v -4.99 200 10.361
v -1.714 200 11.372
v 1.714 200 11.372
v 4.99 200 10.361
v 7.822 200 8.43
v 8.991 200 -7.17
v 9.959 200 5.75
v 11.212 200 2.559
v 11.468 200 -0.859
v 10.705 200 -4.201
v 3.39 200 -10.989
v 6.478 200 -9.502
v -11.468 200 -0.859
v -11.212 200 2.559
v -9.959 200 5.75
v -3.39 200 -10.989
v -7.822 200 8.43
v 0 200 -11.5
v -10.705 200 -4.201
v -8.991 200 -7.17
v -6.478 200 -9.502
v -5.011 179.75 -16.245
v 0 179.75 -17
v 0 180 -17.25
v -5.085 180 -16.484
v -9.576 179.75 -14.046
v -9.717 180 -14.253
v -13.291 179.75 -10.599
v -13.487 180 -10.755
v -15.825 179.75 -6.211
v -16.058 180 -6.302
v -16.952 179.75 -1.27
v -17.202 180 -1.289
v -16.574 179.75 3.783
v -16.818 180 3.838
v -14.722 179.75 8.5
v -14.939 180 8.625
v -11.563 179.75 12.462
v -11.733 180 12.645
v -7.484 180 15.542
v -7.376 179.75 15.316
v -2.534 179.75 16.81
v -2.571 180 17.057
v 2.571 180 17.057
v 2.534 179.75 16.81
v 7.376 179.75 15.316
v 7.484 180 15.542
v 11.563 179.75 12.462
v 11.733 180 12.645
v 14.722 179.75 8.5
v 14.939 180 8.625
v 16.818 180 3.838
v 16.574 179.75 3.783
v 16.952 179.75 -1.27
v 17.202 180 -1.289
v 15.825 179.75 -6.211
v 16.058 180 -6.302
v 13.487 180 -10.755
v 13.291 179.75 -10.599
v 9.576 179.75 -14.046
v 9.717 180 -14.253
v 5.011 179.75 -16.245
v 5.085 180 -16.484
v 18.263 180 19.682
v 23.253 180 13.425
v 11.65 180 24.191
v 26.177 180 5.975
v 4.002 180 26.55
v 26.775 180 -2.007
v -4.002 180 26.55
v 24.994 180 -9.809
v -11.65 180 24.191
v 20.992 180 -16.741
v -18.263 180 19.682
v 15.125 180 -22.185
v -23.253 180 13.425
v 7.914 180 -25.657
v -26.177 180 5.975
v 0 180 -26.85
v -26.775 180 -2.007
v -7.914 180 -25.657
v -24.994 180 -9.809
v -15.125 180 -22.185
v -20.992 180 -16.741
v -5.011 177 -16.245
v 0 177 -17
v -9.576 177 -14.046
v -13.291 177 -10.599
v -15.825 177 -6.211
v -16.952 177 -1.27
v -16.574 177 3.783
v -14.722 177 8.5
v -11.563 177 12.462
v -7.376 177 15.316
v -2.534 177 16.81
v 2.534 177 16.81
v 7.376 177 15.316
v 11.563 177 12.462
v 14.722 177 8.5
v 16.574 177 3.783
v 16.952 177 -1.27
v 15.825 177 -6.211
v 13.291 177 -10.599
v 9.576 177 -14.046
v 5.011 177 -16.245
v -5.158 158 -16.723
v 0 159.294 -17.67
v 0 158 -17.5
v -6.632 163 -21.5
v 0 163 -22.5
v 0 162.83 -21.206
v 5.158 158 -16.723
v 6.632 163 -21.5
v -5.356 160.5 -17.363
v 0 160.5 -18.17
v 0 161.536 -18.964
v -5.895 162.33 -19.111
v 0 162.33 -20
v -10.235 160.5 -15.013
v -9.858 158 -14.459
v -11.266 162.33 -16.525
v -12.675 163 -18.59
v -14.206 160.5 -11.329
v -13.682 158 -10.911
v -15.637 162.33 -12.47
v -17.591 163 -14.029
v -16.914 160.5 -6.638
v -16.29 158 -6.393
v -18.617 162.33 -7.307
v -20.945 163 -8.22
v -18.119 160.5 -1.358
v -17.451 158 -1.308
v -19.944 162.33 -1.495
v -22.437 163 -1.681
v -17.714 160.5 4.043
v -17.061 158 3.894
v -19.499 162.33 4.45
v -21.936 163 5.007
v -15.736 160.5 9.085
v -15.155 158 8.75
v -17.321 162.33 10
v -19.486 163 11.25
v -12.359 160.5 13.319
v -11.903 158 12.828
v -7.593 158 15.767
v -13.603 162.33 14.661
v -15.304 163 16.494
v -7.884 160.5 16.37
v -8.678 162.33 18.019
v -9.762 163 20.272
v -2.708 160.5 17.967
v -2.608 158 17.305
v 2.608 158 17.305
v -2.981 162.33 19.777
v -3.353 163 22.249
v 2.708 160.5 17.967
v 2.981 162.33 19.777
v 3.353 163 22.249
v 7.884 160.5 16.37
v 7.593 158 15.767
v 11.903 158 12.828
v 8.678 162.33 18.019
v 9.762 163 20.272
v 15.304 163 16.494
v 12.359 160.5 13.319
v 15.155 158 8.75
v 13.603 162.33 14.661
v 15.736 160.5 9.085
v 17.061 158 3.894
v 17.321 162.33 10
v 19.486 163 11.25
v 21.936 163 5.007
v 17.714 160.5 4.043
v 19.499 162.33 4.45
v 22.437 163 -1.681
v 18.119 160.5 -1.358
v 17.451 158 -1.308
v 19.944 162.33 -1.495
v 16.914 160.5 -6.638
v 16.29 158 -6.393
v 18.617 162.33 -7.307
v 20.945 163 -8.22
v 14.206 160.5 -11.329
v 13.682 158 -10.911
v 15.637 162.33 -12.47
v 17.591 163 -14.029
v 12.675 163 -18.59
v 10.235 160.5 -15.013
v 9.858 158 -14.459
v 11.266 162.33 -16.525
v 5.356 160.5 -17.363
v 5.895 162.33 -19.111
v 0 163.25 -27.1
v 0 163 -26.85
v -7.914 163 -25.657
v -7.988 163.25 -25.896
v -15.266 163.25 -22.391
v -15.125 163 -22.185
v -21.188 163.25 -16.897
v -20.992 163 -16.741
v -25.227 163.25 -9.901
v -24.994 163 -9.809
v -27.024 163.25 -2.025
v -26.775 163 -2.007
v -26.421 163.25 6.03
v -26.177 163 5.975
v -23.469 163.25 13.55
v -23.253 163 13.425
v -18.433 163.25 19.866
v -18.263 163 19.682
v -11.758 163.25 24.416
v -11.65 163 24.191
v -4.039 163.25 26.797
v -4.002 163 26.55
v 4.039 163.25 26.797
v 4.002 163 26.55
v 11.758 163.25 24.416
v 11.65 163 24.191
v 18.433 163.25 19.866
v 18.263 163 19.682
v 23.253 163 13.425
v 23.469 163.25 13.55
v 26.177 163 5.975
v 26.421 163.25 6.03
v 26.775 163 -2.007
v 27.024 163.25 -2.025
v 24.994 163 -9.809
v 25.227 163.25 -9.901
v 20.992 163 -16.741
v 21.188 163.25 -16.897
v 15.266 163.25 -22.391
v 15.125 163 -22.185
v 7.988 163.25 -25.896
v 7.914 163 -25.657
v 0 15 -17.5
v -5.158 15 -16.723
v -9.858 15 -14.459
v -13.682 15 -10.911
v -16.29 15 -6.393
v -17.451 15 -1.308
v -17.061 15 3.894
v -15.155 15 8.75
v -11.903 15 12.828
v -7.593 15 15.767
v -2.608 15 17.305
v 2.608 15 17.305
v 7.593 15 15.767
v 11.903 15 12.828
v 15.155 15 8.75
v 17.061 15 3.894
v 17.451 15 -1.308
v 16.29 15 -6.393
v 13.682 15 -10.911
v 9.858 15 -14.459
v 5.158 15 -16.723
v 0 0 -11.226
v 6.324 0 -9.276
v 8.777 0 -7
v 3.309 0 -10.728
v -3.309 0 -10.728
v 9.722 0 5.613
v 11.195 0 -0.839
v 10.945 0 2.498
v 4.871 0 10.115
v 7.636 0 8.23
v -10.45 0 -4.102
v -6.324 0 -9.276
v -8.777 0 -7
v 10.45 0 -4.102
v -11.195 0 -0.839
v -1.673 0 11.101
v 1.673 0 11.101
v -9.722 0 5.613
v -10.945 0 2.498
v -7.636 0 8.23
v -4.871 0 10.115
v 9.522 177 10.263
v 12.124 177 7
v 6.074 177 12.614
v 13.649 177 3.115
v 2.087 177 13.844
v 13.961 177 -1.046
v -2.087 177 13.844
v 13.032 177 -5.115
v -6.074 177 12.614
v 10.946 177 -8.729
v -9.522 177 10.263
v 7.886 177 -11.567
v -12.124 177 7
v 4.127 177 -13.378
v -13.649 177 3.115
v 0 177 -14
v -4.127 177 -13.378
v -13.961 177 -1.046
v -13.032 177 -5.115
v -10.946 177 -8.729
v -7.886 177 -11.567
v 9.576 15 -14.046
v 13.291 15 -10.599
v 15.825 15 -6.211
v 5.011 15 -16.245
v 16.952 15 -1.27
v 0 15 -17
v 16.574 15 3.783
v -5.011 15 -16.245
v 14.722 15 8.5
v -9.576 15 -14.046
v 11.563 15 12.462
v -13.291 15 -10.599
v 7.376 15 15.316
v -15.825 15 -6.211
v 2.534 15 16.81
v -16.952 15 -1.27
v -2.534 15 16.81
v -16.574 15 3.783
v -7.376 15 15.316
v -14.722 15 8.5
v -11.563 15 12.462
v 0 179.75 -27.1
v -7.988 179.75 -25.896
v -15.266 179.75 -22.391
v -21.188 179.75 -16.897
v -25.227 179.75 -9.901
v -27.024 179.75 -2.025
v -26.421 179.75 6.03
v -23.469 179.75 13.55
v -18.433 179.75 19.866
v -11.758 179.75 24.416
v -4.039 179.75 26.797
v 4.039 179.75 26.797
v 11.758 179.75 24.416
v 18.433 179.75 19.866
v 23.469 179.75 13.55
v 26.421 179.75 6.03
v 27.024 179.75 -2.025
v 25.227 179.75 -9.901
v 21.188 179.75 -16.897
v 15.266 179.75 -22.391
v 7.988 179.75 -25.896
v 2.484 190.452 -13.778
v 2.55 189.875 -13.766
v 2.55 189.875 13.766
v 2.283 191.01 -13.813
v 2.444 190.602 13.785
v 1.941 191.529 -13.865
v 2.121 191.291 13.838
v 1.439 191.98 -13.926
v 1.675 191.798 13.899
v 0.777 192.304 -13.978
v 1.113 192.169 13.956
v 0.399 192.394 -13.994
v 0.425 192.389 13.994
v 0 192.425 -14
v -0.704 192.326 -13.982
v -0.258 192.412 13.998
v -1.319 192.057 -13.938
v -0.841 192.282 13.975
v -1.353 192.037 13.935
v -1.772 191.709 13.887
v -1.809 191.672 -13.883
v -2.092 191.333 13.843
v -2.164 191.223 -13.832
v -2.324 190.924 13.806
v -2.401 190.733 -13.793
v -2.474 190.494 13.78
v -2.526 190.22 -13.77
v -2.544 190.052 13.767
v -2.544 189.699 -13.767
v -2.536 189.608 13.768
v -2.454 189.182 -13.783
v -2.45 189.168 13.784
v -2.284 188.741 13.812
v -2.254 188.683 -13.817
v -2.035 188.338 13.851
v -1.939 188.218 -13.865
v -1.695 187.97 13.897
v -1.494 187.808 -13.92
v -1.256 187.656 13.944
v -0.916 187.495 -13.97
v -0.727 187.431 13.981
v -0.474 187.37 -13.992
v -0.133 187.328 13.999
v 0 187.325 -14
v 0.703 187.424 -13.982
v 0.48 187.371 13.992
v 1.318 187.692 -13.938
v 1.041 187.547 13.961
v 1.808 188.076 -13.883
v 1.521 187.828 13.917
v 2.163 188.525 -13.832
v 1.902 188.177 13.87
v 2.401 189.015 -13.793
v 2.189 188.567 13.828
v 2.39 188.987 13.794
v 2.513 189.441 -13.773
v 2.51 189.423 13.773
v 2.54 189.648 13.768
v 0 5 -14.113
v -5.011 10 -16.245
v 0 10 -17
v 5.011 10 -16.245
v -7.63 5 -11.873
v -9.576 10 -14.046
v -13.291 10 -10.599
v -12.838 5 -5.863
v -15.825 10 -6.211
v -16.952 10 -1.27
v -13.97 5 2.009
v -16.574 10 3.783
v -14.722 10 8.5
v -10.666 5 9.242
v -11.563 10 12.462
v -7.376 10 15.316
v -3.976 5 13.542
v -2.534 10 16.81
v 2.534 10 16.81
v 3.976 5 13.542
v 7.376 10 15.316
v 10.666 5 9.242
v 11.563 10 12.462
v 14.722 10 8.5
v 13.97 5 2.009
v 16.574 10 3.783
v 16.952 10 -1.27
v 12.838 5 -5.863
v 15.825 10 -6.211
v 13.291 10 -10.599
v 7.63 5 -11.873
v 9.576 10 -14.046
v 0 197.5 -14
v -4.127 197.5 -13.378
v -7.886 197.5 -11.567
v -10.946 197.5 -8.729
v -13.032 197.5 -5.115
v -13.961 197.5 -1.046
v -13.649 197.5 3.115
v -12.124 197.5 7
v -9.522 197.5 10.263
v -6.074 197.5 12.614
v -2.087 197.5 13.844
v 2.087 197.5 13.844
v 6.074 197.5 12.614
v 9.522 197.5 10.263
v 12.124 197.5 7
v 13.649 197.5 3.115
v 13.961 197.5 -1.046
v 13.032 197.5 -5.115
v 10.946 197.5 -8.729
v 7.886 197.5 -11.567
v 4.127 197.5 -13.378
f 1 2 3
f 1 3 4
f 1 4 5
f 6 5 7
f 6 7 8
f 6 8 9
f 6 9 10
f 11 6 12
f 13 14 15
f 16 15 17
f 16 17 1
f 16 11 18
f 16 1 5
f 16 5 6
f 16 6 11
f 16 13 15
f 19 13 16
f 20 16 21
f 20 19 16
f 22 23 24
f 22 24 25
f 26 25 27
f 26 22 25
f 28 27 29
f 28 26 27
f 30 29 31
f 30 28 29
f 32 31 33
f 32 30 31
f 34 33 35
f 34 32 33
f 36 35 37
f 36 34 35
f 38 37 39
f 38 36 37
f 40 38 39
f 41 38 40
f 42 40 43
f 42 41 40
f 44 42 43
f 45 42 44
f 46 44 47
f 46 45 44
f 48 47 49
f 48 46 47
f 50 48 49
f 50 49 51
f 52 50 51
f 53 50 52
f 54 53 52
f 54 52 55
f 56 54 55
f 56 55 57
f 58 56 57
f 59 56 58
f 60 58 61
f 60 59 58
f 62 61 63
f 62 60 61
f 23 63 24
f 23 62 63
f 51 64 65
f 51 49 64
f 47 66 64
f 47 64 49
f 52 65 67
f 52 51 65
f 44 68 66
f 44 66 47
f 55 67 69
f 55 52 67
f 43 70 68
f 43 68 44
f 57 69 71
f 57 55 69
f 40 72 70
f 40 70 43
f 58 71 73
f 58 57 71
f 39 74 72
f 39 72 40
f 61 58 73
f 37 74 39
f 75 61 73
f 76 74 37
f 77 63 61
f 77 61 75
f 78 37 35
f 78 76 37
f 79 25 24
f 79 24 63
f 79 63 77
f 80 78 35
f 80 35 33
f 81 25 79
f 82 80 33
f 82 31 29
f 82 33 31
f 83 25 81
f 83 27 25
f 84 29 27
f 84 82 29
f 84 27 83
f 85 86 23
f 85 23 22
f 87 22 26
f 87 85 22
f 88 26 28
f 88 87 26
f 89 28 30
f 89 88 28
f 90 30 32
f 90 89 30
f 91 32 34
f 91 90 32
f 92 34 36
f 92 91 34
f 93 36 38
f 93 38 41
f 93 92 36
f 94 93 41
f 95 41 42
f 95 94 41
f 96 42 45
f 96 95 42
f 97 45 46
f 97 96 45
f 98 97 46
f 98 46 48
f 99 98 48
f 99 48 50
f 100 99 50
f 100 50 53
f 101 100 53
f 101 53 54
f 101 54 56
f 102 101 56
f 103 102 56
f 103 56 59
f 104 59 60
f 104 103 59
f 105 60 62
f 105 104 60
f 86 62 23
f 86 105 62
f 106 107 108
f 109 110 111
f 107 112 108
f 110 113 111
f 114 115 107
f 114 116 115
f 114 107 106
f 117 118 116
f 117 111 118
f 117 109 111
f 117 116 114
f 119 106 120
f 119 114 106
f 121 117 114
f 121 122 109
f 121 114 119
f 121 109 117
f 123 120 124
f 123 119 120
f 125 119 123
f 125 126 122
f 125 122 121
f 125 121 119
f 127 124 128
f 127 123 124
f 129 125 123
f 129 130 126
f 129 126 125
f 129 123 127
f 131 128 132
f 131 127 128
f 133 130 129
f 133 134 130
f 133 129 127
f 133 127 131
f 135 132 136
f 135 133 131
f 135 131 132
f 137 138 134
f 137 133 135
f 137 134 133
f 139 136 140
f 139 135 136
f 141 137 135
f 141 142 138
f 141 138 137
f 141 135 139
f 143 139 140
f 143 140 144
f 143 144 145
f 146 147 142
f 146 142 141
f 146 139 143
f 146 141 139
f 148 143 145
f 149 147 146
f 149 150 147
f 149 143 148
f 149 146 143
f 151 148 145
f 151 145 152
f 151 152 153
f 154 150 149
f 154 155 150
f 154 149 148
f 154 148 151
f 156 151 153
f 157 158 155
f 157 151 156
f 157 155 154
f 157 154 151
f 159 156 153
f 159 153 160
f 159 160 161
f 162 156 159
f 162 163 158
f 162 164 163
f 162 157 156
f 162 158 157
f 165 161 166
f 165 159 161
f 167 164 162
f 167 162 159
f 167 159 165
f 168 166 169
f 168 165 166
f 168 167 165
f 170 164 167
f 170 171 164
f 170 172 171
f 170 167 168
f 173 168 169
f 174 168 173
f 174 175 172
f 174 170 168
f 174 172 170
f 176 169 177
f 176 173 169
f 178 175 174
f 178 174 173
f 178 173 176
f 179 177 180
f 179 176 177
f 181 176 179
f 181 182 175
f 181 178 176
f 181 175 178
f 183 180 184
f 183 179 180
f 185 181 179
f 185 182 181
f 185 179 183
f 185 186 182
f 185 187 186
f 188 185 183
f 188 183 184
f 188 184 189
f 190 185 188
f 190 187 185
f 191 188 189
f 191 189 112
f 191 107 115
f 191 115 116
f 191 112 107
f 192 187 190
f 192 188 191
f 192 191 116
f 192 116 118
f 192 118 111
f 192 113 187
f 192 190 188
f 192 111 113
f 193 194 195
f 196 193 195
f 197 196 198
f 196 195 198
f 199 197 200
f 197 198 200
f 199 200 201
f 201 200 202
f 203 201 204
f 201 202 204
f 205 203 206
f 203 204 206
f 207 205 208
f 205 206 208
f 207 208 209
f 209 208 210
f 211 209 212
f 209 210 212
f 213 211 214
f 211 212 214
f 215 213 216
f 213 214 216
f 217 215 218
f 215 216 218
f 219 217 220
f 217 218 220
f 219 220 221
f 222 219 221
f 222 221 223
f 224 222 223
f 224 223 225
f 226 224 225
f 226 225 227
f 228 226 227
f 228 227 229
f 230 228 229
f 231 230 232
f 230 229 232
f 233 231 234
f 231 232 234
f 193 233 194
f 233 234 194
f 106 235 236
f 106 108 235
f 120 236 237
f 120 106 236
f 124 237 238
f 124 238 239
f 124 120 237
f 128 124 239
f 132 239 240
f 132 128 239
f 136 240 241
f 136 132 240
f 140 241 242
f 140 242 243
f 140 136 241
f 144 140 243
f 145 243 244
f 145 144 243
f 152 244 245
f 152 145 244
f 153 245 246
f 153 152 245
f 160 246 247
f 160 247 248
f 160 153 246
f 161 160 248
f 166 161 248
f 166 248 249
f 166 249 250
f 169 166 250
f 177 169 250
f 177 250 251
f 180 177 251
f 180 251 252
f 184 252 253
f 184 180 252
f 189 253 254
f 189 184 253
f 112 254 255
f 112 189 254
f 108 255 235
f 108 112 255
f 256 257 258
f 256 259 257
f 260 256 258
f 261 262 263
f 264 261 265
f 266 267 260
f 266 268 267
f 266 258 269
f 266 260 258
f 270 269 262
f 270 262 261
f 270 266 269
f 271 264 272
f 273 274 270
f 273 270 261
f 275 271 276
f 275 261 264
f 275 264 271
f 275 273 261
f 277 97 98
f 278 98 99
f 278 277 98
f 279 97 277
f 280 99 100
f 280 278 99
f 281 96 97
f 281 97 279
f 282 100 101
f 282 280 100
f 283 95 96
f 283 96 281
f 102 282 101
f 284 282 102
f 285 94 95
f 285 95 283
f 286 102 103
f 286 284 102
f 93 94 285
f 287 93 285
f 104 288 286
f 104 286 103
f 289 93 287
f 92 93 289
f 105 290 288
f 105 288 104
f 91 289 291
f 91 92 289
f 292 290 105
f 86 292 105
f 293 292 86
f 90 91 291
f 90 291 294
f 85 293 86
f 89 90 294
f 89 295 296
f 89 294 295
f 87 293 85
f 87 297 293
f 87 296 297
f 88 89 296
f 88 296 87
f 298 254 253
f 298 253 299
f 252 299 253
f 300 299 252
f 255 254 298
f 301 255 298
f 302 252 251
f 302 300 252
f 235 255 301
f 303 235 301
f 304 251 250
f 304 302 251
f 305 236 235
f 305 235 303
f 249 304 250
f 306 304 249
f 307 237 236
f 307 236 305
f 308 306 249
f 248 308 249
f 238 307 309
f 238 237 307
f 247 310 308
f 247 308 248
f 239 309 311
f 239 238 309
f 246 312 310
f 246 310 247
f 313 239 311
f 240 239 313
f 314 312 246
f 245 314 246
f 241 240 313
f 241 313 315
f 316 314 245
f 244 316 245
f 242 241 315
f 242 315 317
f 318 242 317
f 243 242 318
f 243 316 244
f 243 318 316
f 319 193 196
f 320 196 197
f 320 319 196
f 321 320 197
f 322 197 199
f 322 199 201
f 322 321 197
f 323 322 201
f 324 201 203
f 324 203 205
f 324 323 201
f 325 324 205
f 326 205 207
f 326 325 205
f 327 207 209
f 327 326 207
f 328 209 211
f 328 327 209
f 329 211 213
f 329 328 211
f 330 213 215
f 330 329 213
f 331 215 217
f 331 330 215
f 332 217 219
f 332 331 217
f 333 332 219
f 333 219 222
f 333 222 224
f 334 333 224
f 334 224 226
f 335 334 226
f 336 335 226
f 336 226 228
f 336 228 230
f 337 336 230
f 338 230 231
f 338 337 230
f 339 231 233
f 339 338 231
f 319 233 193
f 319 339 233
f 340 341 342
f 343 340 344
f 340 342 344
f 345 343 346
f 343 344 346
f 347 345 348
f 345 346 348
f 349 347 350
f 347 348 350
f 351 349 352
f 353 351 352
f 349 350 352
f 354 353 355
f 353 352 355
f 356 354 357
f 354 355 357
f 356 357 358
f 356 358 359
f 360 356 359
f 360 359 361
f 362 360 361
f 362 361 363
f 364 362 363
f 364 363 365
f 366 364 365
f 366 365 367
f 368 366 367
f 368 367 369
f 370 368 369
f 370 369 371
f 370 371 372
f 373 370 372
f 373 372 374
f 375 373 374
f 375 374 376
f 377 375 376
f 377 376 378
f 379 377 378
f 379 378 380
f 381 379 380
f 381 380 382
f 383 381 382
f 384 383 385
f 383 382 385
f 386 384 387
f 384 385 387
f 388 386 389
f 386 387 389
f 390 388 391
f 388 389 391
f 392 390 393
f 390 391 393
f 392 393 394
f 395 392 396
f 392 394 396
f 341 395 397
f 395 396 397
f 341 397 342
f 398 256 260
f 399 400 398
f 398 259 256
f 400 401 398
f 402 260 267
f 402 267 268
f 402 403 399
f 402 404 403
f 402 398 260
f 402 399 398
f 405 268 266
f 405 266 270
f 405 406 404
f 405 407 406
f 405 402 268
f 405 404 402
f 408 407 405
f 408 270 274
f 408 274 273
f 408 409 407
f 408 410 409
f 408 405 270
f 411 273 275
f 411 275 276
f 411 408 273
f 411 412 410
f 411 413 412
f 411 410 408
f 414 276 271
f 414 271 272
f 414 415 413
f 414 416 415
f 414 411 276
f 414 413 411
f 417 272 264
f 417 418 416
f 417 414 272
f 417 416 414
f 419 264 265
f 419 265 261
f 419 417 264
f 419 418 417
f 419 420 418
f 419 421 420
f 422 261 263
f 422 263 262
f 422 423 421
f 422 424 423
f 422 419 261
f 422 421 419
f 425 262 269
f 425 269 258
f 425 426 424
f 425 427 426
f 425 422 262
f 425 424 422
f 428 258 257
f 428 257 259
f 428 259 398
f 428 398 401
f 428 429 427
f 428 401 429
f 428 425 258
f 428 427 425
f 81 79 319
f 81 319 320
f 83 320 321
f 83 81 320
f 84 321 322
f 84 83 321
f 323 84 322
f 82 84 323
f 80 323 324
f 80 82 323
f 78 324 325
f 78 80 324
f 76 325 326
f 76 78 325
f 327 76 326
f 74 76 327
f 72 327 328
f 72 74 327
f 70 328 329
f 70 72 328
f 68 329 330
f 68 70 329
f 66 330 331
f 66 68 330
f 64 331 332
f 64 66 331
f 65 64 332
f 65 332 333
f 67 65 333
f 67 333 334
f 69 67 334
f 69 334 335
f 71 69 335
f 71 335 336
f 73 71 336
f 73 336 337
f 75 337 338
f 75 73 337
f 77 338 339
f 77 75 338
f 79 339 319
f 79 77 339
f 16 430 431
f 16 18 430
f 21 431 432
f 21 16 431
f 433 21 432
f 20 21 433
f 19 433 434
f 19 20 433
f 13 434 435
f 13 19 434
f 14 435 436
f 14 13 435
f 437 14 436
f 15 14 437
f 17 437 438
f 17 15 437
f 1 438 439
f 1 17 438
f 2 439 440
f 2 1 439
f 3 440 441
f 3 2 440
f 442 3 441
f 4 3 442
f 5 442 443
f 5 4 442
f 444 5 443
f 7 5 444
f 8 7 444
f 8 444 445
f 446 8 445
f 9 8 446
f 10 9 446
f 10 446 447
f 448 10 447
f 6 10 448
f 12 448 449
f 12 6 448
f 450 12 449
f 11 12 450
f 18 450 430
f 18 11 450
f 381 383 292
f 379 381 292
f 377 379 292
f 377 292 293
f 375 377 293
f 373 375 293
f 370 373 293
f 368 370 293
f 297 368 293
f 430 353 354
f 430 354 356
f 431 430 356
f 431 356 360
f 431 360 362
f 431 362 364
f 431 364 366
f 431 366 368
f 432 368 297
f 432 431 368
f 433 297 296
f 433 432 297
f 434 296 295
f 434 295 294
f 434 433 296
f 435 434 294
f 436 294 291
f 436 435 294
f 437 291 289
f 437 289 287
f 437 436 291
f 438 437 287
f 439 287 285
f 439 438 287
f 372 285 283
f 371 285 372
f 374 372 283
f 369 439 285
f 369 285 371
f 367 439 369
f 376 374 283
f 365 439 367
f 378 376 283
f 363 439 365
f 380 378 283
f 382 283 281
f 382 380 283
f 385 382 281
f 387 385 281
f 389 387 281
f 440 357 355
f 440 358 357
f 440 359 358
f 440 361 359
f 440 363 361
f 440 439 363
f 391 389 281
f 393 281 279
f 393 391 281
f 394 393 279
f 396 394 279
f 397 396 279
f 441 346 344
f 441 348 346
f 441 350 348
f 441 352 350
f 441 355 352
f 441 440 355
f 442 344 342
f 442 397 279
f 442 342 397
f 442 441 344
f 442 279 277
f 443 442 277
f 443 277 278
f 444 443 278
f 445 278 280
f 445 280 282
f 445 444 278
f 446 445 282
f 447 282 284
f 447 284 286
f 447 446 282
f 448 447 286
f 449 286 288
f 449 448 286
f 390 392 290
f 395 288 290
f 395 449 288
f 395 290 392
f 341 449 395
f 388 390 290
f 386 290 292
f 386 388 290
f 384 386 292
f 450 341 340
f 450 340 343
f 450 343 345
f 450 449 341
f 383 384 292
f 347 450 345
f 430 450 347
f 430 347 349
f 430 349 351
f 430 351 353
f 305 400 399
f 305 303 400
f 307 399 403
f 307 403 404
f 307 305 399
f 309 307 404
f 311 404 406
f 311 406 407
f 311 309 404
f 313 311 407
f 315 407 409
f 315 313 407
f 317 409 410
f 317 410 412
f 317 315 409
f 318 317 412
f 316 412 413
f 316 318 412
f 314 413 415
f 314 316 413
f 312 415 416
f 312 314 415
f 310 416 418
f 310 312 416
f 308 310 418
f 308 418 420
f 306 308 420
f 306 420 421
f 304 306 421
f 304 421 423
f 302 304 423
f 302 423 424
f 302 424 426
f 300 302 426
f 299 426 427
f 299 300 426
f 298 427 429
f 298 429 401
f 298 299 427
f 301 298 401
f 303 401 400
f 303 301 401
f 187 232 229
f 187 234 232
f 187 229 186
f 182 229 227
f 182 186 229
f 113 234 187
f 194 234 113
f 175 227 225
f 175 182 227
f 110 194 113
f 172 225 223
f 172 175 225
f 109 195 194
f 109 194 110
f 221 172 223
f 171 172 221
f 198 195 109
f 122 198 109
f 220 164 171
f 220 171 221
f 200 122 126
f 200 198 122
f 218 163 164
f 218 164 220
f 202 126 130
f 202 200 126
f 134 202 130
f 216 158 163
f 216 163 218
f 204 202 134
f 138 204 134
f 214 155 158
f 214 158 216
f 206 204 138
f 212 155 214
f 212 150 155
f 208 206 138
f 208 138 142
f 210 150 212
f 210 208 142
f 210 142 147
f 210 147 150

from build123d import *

# Parameters (mm, degrees)
CHAMFER1_SIZE      = 0.25
CHAMFER2_SIZE      = 0.25
CHAMFER3_SIZE      = 0.25
SKETCH2_R          = 2.55
CUT_EXTRUDE1_DEPTH = 15


with BuildPart() as part:
    # Sketch1 → Revolve1 (revolve)
    with BuildSketch(Plane.XY, mode=Mode.PRIVATE) as revolve1_sk:
        with BuildLine():
            Line((17.5, 15), (17.5, 158))
            ThreePointArc((17.5, 158), (18.964466094, 161.535533906), (22.5, 163))
            Line((22.5, 163), (27.1, 163))
            Line((27.1, 163), (27.1, 180))
            Line((27.1, 180), (17, 180))
            Line((17, 180), (17, 177))
            Line((17, 177), (14, 177))
            Line((14, 177), (14, 197.5))
            Line((14, 197.5), (11.5, 200))
            Line((11.5, 200), (0, 200))
            Line((0, 200), (0, 0))
            Line((0, 0), (11.226497308, 0))
            Line((11.226497308, 0), (17, 10))
            Line((17, 10), (17, 15))
            Line((17, 15), (17.5, 15))
        make_face()
    revolve(revolve1_sk.sketch.rotate(Axis((0, 0, 0), (0, 1, 0)), 90), axis=Axis((0, 0, 0), (0, 1, 0)))  # turned: the seam where the file's is

    # Chamfer1
    chamfer1_edges = [part.edges().sort_by_distance(p)[0] for p in [
        (0, 180, 27.1),
    ]]
    chamfer(chamfer1_edges, length=CHAMFER1_SIZE)

    # Chamfer2
    chamfer2_edges = [part.edges().sort_by_distance(p)[0] for p in [
        (0, 163, 27.1),
    ]]
    chamfer(chamfer2_edges, length=CHAMFER2_SIZE)

    # Chamfer3
    chamfer3_edges = [part.edges().sort_by_distance(p)[0] for p in [
        (0, 180, 17),
    ]]
    chamfer(chamfer3_edges, length=CHAMFER3_SIZE)

    # Sketch2 → Cut-Extrude1 (cut, symmetric)
    with BuildSketch(Plane.XY):
        with Locations((0, 189.875)):
            Circle(SKETCH2_R)
    extrude(amount=CUT_EXTRUDE1_DEPTH, both=True, mode=Mode.SUBTRACT)


solid = part.part
